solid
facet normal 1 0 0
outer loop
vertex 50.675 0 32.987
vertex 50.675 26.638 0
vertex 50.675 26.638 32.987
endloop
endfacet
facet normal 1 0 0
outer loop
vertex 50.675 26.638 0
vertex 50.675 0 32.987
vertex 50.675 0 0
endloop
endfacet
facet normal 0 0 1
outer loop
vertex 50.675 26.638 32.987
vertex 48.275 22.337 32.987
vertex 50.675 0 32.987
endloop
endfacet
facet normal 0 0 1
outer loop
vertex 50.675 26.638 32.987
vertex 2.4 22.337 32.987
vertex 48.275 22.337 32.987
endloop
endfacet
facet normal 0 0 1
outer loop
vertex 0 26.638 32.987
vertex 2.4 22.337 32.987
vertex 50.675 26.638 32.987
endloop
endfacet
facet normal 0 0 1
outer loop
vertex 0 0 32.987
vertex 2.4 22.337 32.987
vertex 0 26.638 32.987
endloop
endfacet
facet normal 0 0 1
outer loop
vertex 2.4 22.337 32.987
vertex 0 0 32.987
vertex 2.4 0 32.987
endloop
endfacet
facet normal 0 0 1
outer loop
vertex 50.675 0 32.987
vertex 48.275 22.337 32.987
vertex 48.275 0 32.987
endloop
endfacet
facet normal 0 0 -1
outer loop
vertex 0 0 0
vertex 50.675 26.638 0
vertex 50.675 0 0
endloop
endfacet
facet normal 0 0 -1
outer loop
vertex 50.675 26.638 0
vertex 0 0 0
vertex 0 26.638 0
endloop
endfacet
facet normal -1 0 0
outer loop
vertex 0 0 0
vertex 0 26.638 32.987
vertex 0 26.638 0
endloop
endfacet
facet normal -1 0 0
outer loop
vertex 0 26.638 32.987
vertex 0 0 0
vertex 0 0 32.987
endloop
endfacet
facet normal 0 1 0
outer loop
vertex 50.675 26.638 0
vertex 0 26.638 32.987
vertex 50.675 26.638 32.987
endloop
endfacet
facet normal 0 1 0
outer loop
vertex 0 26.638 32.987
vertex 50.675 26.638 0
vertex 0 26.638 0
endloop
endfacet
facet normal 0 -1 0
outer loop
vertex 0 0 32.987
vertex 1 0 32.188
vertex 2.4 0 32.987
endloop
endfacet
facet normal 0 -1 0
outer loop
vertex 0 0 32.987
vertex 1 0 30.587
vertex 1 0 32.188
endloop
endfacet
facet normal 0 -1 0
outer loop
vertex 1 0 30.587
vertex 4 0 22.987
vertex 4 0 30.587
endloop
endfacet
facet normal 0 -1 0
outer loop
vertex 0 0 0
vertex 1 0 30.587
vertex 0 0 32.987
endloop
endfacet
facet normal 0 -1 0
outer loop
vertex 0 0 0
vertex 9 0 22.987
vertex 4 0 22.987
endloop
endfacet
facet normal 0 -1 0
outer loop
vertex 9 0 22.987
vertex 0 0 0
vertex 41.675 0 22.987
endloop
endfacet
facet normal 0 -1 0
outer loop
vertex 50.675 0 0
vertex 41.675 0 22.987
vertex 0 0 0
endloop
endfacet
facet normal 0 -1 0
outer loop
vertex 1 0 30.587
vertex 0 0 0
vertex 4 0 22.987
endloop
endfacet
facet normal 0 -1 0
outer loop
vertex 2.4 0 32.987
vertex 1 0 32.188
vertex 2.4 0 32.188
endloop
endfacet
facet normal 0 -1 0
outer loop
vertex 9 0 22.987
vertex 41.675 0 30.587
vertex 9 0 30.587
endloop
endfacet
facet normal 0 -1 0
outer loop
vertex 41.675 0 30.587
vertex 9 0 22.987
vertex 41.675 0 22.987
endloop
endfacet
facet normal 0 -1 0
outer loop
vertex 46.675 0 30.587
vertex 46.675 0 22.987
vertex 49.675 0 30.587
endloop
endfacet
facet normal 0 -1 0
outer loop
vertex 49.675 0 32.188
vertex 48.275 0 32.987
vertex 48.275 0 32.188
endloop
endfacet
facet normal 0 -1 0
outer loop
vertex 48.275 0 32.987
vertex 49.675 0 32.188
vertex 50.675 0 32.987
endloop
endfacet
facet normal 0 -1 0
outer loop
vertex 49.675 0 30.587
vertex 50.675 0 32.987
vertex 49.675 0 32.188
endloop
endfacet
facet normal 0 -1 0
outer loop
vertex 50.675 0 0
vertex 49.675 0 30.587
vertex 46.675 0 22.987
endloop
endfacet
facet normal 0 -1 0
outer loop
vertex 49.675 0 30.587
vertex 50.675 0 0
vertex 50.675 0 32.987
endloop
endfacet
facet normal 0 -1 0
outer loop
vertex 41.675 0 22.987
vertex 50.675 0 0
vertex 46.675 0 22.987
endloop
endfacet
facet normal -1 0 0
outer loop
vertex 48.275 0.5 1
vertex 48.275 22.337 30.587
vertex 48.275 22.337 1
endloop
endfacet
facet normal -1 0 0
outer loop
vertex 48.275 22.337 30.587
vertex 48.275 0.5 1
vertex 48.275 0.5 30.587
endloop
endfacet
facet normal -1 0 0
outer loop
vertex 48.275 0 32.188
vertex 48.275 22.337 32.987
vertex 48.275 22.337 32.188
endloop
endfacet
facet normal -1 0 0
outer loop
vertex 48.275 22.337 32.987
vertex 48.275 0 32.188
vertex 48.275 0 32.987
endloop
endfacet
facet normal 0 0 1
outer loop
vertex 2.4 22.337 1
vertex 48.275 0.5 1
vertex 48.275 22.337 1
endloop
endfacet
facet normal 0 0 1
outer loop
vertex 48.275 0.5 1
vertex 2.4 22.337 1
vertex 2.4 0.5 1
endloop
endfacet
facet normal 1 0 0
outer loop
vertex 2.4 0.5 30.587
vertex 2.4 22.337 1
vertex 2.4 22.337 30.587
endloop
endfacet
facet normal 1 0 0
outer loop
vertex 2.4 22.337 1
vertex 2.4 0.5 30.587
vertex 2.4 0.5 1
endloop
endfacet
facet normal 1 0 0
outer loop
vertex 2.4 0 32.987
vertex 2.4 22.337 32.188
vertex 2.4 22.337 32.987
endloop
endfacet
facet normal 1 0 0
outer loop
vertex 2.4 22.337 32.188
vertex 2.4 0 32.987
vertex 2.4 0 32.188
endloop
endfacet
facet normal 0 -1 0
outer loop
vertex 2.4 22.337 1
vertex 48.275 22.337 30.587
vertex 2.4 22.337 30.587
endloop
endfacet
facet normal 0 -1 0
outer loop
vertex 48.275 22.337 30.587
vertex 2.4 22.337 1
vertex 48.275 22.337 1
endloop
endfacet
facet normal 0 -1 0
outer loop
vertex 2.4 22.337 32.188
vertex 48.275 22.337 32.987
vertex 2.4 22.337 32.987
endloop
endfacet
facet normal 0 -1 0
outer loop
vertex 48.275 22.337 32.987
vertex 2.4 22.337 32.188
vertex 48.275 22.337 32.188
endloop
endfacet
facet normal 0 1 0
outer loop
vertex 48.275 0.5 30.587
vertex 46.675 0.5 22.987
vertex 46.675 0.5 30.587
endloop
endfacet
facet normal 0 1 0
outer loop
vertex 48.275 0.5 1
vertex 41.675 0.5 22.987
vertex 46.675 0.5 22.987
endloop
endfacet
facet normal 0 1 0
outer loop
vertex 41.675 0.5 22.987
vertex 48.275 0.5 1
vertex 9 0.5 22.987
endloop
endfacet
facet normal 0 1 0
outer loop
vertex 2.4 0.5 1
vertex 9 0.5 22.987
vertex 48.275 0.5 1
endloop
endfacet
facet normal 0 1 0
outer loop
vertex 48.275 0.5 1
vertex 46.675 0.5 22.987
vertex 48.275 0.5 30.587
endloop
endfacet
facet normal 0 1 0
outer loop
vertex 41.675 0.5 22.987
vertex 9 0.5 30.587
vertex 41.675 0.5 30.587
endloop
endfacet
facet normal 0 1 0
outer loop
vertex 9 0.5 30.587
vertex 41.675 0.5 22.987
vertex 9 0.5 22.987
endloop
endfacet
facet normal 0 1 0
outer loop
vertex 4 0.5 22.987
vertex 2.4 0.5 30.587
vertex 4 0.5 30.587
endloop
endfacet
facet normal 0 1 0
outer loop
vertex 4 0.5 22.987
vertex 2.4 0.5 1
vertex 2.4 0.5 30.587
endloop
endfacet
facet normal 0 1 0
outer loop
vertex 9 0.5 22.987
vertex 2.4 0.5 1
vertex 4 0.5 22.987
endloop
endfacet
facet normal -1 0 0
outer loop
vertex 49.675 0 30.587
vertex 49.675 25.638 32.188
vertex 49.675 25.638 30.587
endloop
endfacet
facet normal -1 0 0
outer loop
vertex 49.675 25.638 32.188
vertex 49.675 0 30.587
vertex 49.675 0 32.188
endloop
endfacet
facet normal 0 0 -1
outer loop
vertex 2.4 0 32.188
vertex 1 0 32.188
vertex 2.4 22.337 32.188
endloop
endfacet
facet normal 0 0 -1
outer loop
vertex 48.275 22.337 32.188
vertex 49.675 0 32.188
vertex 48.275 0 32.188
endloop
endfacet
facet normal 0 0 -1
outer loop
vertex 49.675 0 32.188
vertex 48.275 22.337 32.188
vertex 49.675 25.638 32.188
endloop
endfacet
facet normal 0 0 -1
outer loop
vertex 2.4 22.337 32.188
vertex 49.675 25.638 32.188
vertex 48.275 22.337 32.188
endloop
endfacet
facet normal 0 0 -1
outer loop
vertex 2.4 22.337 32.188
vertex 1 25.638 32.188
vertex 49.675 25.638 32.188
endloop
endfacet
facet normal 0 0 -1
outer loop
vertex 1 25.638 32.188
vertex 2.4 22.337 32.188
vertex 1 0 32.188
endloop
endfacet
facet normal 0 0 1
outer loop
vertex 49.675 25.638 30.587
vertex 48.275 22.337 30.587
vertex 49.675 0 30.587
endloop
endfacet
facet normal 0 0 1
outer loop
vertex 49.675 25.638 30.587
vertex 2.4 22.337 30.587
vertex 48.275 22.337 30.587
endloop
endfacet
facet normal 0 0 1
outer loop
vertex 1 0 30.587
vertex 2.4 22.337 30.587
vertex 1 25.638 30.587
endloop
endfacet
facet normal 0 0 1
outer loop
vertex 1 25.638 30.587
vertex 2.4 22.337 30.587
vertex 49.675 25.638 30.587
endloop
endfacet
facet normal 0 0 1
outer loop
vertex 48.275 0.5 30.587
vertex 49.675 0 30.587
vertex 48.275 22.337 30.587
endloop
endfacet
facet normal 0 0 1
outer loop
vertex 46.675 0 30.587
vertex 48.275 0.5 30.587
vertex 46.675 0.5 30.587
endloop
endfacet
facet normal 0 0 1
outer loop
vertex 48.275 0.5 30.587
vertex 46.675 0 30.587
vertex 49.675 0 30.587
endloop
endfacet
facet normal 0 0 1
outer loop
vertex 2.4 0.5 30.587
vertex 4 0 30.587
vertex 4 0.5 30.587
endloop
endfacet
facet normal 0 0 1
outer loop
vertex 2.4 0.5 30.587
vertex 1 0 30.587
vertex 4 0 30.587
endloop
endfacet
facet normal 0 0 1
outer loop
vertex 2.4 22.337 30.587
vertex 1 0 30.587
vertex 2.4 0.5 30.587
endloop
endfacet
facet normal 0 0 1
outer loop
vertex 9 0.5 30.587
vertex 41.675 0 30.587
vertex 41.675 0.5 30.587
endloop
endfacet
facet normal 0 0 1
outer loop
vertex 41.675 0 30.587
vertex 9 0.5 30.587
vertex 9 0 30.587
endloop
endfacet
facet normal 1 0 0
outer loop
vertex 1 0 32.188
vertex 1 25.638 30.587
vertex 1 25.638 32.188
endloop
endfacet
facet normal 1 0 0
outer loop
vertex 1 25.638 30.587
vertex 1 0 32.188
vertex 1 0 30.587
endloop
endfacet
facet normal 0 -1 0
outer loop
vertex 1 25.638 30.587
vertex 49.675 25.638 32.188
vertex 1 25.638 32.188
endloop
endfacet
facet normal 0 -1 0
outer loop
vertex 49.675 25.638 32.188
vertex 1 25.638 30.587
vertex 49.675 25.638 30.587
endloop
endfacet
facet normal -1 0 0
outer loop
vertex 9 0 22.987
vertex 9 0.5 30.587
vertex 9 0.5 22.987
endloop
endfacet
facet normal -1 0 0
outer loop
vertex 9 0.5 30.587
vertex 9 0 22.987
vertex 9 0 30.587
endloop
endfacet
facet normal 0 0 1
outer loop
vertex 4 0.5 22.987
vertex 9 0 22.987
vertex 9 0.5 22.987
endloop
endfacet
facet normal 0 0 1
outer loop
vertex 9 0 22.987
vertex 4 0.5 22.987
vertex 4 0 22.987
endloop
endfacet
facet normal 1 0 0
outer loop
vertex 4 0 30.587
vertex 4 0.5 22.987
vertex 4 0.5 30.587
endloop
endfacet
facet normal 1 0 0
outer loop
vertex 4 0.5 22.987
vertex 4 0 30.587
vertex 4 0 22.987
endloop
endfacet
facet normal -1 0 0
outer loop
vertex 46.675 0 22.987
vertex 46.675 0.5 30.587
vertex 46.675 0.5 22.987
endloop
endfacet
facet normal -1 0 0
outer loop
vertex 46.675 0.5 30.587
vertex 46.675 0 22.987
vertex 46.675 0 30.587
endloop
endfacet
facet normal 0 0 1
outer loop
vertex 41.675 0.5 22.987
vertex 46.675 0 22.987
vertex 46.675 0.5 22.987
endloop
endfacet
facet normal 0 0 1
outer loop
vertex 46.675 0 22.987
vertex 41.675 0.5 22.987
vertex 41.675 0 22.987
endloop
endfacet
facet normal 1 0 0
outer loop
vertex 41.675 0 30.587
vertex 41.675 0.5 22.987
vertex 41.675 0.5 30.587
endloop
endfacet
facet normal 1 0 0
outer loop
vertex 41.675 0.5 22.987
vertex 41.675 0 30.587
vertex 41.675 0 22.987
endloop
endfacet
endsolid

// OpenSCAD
length = 50.675; // actual length of piece is 41.75
width = 26.6375; // actual width is 20.6375
height = 32.9875; //actual height is 26.9875



difference(){
cube([length, width, height]);
translate([2.4, 0.5, 1])cube([length-4.8, width - 4.8, 50]);
translate([1, -1, height - 2.4])cube([length-2, width, 1.6]);
translate([2.4, -1.8, height -2.4])cube([length-4.8, 5, 50]);
translate([4, -1, height-10])cube([5, 10, 50]);
translate([length - 9, -1, height-10])cube([5, 10, 50]);
//translate([-1, width-10, height-10])cube([length + 10 ,5,7]);

}
